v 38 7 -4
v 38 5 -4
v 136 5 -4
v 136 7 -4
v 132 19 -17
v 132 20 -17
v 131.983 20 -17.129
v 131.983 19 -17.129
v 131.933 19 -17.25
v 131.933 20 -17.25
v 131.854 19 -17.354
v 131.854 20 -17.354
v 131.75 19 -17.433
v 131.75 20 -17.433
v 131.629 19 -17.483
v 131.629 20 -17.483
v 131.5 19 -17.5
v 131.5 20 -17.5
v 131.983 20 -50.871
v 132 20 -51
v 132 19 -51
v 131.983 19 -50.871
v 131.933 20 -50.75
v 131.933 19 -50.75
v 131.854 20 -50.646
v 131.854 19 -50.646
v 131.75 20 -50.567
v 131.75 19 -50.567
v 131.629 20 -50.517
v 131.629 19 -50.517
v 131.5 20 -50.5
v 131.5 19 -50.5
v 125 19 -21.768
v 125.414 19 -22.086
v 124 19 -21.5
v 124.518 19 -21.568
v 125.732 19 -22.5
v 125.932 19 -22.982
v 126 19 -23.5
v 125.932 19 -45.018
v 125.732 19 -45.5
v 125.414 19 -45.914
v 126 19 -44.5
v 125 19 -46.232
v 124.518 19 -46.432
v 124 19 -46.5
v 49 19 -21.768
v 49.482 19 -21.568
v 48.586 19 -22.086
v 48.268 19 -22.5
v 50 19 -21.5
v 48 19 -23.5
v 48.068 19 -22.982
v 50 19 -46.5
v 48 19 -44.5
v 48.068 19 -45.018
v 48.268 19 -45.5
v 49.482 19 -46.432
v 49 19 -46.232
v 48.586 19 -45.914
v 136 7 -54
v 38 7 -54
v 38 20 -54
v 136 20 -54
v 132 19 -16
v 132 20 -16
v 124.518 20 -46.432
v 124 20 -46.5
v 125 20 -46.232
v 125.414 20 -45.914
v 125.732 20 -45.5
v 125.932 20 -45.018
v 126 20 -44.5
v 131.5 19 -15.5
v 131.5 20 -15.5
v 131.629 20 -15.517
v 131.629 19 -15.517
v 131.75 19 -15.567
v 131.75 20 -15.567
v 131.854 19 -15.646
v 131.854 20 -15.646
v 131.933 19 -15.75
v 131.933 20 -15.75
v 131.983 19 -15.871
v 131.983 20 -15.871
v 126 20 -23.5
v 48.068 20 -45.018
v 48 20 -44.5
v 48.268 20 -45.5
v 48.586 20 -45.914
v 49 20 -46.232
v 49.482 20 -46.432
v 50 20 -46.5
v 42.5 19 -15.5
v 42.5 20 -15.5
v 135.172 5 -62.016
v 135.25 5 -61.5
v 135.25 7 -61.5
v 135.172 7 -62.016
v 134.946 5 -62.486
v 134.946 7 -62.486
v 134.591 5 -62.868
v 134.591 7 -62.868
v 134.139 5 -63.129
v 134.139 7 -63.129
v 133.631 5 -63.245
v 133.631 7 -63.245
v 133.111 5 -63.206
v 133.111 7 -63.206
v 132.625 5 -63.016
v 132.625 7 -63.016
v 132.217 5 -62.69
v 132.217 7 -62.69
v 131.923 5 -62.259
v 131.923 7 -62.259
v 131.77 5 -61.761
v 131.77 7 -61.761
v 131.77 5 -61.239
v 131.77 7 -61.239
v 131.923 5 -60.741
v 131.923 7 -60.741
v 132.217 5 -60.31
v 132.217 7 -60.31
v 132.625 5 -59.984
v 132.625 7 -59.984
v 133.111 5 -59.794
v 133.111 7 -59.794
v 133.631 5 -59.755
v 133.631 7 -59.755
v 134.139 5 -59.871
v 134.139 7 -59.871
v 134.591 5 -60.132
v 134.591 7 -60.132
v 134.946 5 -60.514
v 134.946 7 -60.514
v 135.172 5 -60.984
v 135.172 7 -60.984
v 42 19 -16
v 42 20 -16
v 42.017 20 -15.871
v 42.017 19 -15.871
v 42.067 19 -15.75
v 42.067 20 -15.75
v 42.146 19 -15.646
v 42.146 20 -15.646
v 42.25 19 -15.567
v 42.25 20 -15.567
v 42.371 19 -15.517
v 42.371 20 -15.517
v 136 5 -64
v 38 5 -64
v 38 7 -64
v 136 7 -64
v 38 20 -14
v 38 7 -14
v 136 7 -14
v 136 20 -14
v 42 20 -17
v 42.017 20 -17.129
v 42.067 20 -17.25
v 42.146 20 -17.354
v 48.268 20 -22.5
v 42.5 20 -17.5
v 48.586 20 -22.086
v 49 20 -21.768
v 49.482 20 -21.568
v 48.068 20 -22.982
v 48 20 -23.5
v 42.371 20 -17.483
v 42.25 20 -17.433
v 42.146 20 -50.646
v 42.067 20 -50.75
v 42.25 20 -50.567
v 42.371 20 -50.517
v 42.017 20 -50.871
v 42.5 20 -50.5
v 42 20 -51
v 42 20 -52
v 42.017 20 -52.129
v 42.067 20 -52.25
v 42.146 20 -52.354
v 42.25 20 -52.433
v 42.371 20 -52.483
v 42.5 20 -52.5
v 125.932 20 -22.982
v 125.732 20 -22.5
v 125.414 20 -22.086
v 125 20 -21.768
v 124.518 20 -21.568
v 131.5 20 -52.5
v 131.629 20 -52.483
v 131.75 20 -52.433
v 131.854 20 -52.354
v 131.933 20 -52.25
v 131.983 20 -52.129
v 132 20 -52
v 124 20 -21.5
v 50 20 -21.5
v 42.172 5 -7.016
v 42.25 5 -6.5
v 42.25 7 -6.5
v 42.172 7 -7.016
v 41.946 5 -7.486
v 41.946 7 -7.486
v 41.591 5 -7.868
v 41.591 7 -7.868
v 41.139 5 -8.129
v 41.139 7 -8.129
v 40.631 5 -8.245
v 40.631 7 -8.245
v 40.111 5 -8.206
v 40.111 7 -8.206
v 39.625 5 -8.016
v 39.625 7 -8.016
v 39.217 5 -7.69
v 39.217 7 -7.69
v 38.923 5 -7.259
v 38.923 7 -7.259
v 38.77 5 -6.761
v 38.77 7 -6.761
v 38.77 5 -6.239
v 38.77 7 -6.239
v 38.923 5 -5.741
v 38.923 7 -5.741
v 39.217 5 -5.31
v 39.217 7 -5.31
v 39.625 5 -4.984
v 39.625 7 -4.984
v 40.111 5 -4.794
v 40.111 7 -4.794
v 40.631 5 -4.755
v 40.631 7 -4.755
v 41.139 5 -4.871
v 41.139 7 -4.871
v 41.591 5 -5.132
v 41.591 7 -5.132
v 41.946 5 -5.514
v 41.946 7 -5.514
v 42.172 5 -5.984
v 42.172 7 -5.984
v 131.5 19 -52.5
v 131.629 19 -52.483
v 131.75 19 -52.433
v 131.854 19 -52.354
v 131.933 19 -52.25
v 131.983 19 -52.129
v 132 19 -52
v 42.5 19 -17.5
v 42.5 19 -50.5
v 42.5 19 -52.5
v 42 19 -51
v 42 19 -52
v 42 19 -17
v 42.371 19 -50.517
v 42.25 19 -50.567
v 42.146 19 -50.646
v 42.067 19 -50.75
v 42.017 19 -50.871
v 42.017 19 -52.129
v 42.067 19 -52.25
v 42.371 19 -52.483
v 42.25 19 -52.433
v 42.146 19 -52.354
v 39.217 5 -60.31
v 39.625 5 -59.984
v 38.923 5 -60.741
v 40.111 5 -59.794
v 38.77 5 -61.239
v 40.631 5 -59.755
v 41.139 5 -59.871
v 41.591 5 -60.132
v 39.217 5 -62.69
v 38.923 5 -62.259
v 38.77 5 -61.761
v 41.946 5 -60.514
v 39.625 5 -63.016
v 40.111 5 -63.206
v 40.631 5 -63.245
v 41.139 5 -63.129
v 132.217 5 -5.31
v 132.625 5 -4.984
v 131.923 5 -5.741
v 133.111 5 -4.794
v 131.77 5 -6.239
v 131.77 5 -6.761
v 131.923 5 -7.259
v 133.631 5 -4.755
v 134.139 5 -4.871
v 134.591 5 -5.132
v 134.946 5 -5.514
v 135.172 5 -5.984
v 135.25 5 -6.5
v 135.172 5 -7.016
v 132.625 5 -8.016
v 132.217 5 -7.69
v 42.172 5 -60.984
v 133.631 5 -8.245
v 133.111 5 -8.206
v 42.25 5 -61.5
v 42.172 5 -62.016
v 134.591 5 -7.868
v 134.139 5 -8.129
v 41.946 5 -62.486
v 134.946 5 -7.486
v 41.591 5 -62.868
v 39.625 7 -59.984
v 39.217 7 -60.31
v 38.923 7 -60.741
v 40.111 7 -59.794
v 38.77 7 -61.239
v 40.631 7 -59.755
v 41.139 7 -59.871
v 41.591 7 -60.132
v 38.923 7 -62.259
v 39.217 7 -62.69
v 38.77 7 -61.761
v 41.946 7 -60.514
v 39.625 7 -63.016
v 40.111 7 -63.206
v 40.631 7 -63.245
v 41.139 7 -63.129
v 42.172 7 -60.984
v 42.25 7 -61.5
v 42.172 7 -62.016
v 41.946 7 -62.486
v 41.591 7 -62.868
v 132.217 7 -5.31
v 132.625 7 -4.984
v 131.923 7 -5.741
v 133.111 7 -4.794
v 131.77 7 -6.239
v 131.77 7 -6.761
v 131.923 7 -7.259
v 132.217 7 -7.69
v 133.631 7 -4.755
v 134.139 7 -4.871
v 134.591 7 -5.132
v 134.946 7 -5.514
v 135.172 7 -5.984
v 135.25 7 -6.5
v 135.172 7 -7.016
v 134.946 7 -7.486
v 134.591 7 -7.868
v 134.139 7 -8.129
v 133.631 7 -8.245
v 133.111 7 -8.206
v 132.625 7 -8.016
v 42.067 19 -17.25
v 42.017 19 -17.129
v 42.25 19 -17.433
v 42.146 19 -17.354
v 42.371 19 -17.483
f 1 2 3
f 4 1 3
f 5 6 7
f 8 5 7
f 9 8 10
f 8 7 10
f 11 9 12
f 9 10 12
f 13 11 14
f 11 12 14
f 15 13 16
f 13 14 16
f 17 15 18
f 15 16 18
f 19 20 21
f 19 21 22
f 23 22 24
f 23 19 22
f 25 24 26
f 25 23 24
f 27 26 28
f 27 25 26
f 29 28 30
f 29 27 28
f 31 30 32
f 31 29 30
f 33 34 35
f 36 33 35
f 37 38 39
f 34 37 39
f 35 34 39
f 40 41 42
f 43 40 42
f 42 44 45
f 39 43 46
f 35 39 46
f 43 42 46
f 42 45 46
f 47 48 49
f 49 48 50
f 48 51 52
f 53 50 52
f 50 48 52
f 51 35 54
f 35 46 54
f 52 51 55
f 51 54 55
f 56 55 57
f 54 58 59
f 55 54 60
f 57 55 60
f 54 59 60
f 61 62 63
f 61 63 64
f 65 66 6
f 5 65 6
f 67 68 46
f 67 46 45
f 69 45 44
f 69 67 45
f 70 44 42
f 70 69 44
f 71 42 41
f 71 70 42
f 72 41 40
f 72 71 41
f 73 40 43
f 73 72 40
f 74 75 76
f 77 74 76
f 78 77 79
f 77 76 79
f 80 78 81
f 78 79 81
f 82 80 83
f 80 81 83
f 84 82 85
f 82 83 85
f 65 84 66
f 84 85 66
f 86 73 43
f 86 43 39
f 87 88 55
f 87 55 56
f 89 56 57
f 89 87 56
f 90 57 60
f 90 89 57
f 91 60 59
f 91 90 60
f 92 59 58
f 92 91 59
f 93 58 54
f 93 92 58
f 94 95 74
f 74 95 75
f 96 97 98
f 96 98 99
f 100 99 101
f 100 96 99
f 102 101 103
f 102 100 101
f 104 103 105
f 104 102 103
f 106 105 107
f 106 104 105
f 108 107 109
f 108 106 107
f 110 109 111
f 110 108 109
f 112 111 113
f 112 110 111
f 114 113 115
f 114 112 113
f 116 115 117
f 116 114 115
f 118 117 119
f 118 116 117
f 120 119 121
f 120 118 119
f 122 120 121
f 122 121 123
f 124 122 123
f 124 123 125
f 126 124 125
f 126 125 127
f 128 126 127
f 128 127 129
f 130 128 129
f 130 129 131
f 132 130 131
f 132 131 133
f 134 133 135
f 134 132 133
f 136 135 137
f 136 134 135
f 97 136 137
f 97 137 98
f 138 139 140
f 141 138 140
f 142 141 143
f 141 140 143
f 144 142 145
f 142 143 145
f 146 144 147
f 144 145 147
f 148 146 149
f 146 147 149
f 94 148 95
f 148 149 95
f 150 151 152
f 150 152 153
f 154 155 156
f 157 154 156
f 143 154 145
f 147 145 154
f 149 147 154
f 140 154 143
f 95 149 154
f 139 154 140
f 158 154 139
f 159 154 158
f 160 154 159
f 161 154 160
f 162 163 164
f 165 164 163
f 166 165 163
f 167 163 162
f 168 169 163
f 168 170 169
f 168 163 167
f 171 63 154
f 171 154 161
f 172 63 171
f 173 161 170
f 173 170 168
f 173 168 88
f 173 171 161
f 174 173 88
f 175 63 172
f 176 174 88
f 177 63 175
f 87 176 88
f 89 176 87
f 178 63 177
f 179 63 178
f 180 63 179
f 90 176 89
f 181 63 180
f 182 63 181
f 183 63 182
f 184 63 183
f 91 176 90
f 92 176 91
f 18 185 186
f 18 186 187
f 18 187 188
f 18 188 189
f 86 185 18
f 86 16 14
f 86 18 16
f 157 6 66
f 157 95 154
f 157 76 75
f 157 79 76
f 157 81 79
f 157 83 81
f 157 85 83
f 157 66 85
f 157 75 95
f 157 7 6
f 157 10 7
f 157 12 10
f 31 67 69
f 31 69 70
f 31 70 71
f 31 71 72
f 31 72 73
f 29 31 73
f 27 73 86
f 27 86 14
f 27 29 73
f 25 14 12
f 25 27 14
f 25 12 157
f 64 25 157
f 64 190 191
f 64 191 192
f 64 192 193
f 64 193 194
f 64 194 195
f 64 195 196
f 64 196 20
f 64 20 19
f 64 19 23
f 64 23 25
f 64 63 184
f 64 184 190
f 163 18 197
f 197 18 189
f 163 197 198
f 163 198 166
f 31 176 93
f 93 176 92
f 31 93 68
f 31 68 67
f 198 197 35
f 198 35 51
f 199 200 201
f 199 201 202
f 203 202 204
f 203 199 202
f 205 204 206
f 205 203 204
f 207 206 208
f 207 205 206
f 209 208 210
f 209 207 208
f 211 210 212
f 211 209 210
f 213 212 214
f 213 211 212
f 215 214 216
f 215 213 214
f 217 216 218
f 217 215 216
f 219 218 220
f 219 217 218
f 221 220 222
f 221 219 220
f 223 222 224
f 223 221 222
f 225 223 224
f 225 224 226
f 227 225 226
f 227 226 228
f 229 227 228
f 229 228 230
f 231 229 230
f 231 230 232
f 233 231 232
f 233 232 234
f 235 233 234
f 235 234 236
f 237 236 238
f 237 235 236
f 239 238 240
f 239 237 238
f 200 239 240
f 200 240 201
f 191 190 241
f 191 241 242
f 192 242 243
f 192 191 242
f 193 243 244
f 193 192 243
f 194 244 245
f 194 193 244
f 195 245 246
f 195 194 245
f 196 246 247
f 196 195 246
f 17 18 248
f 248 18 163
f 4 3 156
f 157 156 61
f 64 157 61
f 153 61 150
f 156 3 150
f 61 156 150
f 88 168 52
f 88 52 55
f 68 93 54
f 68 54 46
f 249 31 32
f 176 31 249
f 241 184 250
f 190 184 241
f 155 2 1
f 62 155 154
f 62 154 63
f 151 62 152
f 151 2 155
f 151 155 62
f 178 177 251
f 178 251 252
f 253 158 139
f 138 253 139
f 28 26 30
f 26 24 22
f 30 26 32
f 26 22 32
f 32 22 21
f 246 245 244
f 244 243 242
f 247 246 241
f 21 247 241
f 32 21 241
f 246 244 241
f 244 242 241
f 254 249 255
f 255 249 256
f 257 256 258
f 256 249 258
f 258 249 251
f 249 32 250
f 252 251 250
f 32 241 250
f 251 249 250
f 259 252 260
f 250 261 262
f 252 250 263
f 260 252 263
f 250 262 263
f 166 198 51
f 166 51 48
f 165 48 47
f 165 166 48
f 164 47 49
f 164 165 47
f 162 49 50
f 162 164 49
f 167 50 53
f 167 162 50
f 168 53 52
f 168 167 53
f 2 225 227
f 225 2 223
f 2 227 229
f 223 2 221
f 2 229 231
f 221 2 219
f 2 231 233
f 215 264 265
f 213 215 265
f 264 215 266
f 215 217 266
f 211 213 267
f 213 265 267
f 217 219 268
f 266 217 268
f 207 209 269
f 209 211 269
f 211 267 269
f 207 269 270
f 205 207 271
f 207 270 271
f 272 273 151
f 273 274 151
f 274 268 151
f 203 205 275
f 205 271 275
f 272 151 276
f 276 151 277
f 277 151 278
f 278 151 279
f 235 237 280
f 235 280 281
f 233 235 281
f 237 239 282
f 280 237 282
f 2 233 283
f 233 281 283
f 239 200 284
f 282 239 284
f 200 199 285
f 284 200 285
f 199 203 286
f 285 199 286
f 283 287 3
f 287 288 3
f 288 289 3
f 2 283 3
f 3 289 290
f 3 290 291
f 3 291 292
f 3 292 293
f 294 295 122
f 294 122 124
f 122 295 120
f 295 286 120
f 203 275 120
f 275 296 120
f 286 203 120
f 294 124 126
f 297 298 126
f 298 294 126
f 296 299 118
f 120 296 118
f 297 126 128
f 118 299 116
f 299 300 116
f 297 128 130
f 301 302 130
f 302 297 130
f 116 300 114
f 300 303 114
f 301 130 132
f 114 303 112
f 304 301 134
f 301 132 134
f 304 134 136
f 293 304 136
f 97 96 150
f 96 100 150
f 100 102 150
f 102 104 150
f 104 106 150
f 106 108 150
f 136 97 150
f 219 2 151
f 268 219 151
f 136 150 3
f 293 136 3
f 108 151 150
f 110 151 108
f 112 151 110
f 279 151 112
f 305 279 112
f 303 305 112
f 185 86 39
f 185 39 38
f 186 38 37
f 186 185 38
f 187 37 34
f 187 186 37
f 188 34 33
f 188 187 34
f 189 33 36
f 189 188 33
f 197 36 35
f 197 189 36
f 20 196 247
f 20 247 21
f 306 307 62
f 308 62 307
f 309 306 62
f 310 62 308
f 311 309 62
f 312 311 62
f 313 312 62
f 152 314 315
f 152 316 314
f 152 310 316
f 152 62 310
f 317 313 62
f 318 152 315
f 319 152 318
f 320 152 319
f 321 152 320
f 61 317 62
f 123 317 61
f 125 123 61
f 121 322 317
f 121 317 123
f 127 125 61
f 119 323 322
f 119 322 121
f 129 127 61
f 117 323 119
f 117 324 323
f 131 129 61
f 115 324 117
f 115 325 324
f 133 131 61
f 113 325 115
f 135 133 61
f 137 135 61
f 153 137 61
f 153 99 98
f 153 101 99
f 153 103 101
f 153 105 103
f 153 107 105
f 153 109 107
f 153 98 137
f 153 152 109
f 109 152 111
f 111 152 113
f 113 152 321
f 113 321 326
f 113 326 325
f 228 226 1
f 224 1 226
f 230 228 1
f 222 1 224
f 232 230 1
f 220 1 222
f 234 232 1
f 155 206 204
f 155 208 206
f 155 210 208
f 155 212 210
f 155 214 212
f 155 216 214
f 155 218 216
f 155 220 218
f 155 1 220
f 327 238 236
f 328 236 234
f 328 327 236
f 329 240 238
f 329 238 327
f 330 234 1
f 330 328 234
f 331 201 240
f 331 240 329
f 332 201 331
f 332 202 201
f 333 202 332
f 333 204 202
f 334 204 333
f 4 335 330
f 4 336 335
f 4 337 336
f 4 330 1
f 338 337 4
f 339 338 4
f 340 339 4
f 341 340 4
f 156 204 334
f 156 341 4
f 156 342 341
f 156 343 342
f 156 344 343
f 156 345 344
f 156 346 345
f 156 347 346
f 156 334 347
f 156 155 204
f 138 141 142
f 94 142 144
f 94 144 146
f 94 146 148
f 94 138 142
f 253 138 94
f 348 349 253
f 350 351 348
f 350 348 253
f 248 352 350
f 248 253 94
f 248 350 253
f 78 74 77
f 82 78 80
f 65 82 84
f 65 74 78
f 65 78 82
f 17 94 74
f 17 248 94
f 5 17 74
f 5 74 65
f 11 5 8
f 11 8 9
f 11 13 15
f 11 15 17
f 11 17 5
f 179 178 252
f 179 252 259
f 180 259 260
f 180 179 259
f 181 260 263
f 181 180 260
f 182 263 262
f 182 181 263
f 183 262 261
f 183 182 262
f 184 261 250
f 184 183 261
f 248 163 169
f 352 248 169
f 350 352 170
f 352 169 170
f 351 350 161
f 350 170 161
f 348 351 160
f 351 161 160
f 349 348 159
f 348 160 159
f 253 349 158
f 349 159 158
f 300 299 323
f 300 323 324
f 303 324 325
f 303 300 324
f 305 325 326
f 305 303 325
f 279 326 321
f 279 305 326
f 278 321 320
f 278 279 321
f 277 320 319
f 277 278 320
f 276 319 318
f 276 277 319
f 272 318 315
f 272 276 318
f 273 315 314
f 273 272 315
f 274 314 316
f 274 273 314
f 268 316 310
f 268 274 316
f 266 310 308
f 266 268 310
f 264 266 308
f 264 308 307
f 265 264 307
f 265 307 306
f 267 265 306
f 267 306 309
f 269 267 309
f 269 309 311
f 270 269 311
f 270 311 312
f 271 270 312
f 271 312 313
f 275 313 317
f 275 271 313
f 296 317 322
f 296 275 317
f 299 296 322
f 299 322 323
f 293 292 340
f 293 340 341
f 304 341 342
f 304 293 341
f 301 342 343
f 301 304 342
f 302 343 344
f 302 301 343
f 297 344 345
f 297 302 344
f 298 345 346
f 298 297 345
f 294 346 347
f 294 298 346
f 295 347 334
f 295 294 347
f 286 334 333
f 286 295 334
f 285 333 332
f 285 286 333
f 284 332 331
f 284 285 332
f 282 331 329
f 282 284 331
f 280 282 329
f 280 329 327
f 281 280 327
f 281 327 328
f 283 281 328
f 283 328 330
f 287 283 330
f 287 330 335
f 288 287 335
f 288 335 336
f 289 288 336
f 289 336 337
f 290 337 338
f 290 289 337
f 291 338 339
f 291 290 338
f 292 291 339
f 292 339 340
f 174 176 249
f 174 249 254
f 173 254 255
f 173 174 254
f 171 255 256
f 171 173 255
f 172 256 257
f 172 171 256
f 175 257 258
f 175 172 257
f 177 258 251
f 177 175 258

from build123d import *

# Parameters (mm, degrees)
SKETCH1_W               = 150
SKETCH1_H               = 55
SKETCH1_R               = 1.5
BOSS_EXTRUDE1_DEPTH     = 2
SKETCH2_R               = 6
BOSS_EXTRUDE2_DEPTH     = 10
SKETCH3_W               = 12
SKETCH3_H               = 12
BOSS_EXTRUDE3_DEPTH     = 25
SKETCH4_W               = 5
SKETCH4_H               = 5
SKETCH4_W_2             = 41
SKETCH4_H_2             = 3
BOSS_EXTRUDE4_DEPTH     = 5
SKETCH5_W               = 41
SKETCH5_H               = 3
SKETCH5_W_2             = 5
SKETCH5_H_2             = 5
SKETCH5_R               = 1.5
CUT_EXTRUDE1_DEPTH      = 2
SKETCH6_W               = 12
SKETCH6_H               = 12
CUT_EXTRUDE2_DEPTH      = 13
SKETCH7_W               = 12
SKETCH7_H               = 12
SKETCH7_R               = 3.5
CUT_EXTRUDE3_DEPTH      = 7
SKETCH8_R               = 1.25
CUT_EXTRUDE4_DEPTH      = 5
BOSS_EXTRUDE5_DEPTH     = 3
SKETCH10_W              = 25
SKETCH10_H              = 1.5
CUT_EXTRUDE5_DEPTH      = 18
SKETCH11_W              = 98
SKETCH11_H              = 60
SKETCH11_R              = 1.75
BOSS_EXTRUDE6_DEPTH     = 2
SKETCH12_W              = 98
SKETCH12_H              = 40
BOSS_EXTRUDE7_DEPTH     = 13
CUT_EXTRUDE6_DEPTH      = 1
SKETCH14_W              = 25
SKETCH14_H              = 1.5
BOSS_EXTRUDE8_DEPTH     = 29
CUT_EXTRUDE7_DEPTH      = 76
CUT_EXTRUDE7_DEPTH_BACK = 10
SKETCH16_W              = 98
SKETCH16_H              = 8
CUT_EXTRUDE8_DEPTH      = 69


with BuildPart() as part:
    # Sketch1 → Boss-Extrude1 (new body)
    with BuildSketch(Plane(origin=(0, 0, 0), x_dir=(1, 0, 0), z_dir=(0, 1, 0))):
        with Locations((75, 27.5)):
            Rectangle(SKETCH1_W, SKETCH1_H)
        with Locations((3, 52)):
            Circle(SKETCH1_R, mode=Mode.SUBTRACT)
        with Locations((147, 52)):
            Circle(SKETCH1_R, mode=Mode.SUBTRACT)
        with Locations((147, 3)):
            Circle(SKETCH1_R, mode=Mode.SUBTRACT)
        with Locations((3, 3)):
            Circle(SKETCH1_R, mode=Mode.SUBTRACT)
    extrude(amount=BOSS_EXTRUDE1_DEPTH)

    # Sketch2 → Boss-Extrude2 (add)
    with BuildSketch(Plane(origin=(0, 2, 0), x_dir=(1, 0, 0), z_dir=(0, 1, 0))):
        with Locations((13, 10)):
            Circle(SKETCH2_R)
    extrude(amount=BOSS_EXTRUDE2_DEPTH)

    # Sketch3 → Boss-Extrude3 (add)
    with BuildSketch(Plane(origin=(0, 2, 0), x_dir=(1, 0, 0), z_dir=(0, 1, 0))):
        with Locations((13, 27.5)):
            Rectangle(SKETCH3_W, SKETCH3_H)
    extrude(amount=BOSS_EXTRUDE3_DEPTH)

    # Sketch4 → Boss-Extrude4 (add)
    with BuildSketch(Plane(origin=(0, 2, 0), x_dir=(1, 0, 0), z_dir=(0, 1, 0))):
        with Locations((13, 43)):
            Rectangle(SKETCH4_W, SKETCH4_H)
        with Locations((106.5, 6.5)):
            Rectangle(SKETCH4_W_2, SKETCH4_H_2)
    extrude(amount=BOSS_EXTRUDE4_DEPTH)

    # Sketch5 → Cut-Extrude1 (cut)
    with BuildSketch(Plane(origin=(0, 7, 0), x_dir=(1, 0, 0), z_dir=(0, 1, 0))):
        with Locations((106.5, 6.5)):
            Rectangle(SKETCH5_W, SKETCH5_H)
        with Locations((13, 43)):
            Rectangle(SKETCH5_W_2, SKETCH5_H_2)
        with Locations((13, 43)):
            Circle(SKETCH5_R, mode=Mode.SUBTRACT)
    extrude(amount=-CUT_EXTRUDE1_DEPTH, mode=Mode.SUBTRACT)

    # Sketch6 → Cut-Extrude2 (cut)
    with BuildSketch(Plane(origin=(0, 27, 0), x_dir=(1, 0, 0), z_dir=(0, 1, 0))):
        with Locations((13, 27.5)):
            Rectangle(SKETCH6_W, SKETCH6_H)
        with BuildLine():
            Line((10.370614338, 26.055586264), (15.629385662, 26.055586264))
            ThreePointArc((15.629385662, 26.055586264), (13, 30.5), (10.370614338, 26.055586264))
        make_face(mode=Mode.SUBTRACT)
    extrude(amount=-CUT_EXTRUDE2_DEPTH, mode=Mode.SUBTRACT)

    # Sketch7 → Cut-Extrude3 (cut)
    with BuildSketch(Plane(origin=(0, 14, 0), x_dir=(1, 0, 0), z_dir=(0, 1, 0))):
        with Locations((13, 27.5)):
            Rectangle(SKETCH7_W, SKETCH7_H)
        with Locations((13, 27.5)):
            Circle(SKETCH7_R, mode=Mode.SUBTRACT)
    extrude(amount=-CUT_EXTRUDE3_DEPTH, mode=Mode.SUBTRACT)

    # Sketch8 → Cut-Extrude4 (cut)
    with BuildSketch(Plane(origin=(0, 12, 0), x_dir=(1, 0, 0), z_dir=(0, 1, 0))):
        with Locations((13, 10)):
            Circle(SKETCH8_R)
    extrude(amount=-CUT_EXTRUDE4_DEPTH, mode=Mode.SUBTRACT)

    # Sketch9 → Boss-Extrude5 (add)
    with BuildSketch(Plane.XZ):
        Polygon((149, -20), (131, -20), (129, -22), (124, -22), (124, -47), (149, -47), align=None)
    extrude(amount=BOSS_EXTRUDE5_DEPTH)

    # Sketch10 → Cut-Extrude5 (cut)
    with BuildSketch(Plane(origin=(149, 0, 0), x_dir=(0, 0, -1), z_dir=(1, 0, 0))):
        with Locations((33.5, -1.5)):
            Rectangle(SKETCH10_W, SKETCH10_H)
    extrude(amount=-CUT_EXTRUDE5_DEPTH, mode=Mode.SUBTRACT)

    # Sketch11 → Boss-Extrude6 (add)
    with BuildSketch(Plane(origin=(0, 5, 0), x_dir=(1, 0, 0), z_dir=(0, 1, 0))):
        with Locations((87, 34)):
            Rectangle(SKETCH11_W, SKETCH11_H)
        with Locations((40.5, 61.5)):
            Circle(SKETCH11_R, mode=Mode.SUBTRACT)
        with Locations((133.5, 61.5)):
            Circle(SKETCH11_R, mode=Mode.SUBTRACT)
        with Locations((133.5, 6.5)):
            Circle(SKETCH11_R, mode=Mode.SUBTRACT)
        with Locations((40.5, 6.5)):
            Circle(SKETCH11_R, mode=Mode.SUBTRACT)
    extrude(amount=BOSS_EXTRUDE6_DEPTH)

    # Sketch12 → Boss-Extrude7 (add)
    with BuildSketch(Plane(origin=(0, 7, 0), x_dir=(1, 0, 0), z_dir=(0, 1, 0))):
        with Locations((87, 34)):
            Rectangle(SKETCH12_W, SKETCH12_H)
    extrude(amount=BOSS_EXTRUDE7_DEPTH)

    # Sketch13 → Cut-Extrude6 (cut)
    with BuildSketch(Plane(origin=(0, 20, 0), x_dir=(1, 0, 0), z_dir=(0, 1, 0))):
        with BuildLine():
            Line((50, 46.5), (124, 46.5))
            ThreePointArc((124, 46.5), (125.414213562, 45.914213562), (126, 44.5))
            Line((126, 44.5), (126, 23.5))
            ThreePointArc((126, 23.5), (125.414213562, 22.085786438), (124, 21.5))
            Line((124, 21.5), (50, 21.5))
            ThreePointArc((50, 21.5), (48.585786438, 22.085786438), (48, 23.5))
            Line((48, 23.5), (48, 44.5))
            ThreePointArc((48, 44.5), (48.585786438, 45.914213562), (50, 46.5))
        make_face()
        with BuildLine():
            Line((42.5, 52.5), (131.5, 52.5))
            ThreePointArc((131.5, 52.5), (131.853553391, 52.353553391), (132, 52))
            Line((132, 52), (132, 51))
            ThreePointArc((132, 51), (131.853553391, 50.646446609), (131.5, 50.5))
            Line((131.5, 50.5), (42.5, 50.5))
            ThreePointArc((42.5, 50.5), (42.146446609, 50.646446609), (42, 51))
            Line((42, 51), (42, 52))
            ThreePointArc((42, 52), (42.146446609, 52.353553391), (42.5, 52.5))
        make_face()
        with BuildLine():
            Line((132, 16), (132, 17))
            ThreePointArc((132, 17), (131.853553391, 17.353553391), (131.5, 17.5))
            Line((131.5, 17.5), (42.5, 17.5))
            ThreePointArc((42.5, 17.5), (42.146446609, 17.353553391), (42, 17))
            Line((42, 17), (42, 16))
            ThreePointArc((42, 16), (42.146446609, 15.646446609), (42.5, 15.5))
            Line((42.5, 15.5), (131.5, 15.5))
            ThreePointArc((131.5, 15.5), (131.853553391, 15.646446609), (132, 16))
        make_face()
    extrude(amount=-CUT_EXTRUDE6_DEPTH, mode=Mode.SUBTRACT)

    # Sketch14 → Boss-Extrude8 (add)
    with BuildSketch(Plane(origin=(131, 0, 0), x_dir=(0, 0, -1), z_dir=(1, 0, 0))):
        with Locations((33.5, -1.5)):
            Rectangle(SKETCH14_W, SKETCH14_H)
    extrude(amount=BOSS_EXTRUDE8_DEPTH)

    # Sketch15 → Cut-Extrude7 (cut, two sides)
    with BuildSketch(Plane(origin=(0, 2, 0), x_dir=(1, 0, 0), z_dir=(0, 1, 0))) as cut_extrude7_sk:
        Polygon((38, 64), (-8.690723281, 64), (-8.690723281, -2.980686498), (38, -2.980686498), (158.556379493, -2.980686498), (158.556379493, 4), (165.16100148, 4), (165.16100148, 64), (136, 64), (136, 4), (38, 4), align=None)
    extrude(amount=CUT_EXTRUDE7_DEPTH, mode=Mode.SUBTRACT)
    extrude(cut_extrude7_sk.sketch, amount=-CUT_EXTRUDE7_DEPTH_BACK, mode=Mode.SUBTRACT)

    # Sketch16 → Cut-Extrude8 (cut)
    with BuildSketch(Plane.XY.offset(-4)):
        with Locations((87, 1)):
            Rectangle(SKETCH16_W, SKETCH16_H)
    extrude(amount=-CUT_EXTRUDE8_DEPTH, mode=Mode.SUBTRACT)


solid = part.part
